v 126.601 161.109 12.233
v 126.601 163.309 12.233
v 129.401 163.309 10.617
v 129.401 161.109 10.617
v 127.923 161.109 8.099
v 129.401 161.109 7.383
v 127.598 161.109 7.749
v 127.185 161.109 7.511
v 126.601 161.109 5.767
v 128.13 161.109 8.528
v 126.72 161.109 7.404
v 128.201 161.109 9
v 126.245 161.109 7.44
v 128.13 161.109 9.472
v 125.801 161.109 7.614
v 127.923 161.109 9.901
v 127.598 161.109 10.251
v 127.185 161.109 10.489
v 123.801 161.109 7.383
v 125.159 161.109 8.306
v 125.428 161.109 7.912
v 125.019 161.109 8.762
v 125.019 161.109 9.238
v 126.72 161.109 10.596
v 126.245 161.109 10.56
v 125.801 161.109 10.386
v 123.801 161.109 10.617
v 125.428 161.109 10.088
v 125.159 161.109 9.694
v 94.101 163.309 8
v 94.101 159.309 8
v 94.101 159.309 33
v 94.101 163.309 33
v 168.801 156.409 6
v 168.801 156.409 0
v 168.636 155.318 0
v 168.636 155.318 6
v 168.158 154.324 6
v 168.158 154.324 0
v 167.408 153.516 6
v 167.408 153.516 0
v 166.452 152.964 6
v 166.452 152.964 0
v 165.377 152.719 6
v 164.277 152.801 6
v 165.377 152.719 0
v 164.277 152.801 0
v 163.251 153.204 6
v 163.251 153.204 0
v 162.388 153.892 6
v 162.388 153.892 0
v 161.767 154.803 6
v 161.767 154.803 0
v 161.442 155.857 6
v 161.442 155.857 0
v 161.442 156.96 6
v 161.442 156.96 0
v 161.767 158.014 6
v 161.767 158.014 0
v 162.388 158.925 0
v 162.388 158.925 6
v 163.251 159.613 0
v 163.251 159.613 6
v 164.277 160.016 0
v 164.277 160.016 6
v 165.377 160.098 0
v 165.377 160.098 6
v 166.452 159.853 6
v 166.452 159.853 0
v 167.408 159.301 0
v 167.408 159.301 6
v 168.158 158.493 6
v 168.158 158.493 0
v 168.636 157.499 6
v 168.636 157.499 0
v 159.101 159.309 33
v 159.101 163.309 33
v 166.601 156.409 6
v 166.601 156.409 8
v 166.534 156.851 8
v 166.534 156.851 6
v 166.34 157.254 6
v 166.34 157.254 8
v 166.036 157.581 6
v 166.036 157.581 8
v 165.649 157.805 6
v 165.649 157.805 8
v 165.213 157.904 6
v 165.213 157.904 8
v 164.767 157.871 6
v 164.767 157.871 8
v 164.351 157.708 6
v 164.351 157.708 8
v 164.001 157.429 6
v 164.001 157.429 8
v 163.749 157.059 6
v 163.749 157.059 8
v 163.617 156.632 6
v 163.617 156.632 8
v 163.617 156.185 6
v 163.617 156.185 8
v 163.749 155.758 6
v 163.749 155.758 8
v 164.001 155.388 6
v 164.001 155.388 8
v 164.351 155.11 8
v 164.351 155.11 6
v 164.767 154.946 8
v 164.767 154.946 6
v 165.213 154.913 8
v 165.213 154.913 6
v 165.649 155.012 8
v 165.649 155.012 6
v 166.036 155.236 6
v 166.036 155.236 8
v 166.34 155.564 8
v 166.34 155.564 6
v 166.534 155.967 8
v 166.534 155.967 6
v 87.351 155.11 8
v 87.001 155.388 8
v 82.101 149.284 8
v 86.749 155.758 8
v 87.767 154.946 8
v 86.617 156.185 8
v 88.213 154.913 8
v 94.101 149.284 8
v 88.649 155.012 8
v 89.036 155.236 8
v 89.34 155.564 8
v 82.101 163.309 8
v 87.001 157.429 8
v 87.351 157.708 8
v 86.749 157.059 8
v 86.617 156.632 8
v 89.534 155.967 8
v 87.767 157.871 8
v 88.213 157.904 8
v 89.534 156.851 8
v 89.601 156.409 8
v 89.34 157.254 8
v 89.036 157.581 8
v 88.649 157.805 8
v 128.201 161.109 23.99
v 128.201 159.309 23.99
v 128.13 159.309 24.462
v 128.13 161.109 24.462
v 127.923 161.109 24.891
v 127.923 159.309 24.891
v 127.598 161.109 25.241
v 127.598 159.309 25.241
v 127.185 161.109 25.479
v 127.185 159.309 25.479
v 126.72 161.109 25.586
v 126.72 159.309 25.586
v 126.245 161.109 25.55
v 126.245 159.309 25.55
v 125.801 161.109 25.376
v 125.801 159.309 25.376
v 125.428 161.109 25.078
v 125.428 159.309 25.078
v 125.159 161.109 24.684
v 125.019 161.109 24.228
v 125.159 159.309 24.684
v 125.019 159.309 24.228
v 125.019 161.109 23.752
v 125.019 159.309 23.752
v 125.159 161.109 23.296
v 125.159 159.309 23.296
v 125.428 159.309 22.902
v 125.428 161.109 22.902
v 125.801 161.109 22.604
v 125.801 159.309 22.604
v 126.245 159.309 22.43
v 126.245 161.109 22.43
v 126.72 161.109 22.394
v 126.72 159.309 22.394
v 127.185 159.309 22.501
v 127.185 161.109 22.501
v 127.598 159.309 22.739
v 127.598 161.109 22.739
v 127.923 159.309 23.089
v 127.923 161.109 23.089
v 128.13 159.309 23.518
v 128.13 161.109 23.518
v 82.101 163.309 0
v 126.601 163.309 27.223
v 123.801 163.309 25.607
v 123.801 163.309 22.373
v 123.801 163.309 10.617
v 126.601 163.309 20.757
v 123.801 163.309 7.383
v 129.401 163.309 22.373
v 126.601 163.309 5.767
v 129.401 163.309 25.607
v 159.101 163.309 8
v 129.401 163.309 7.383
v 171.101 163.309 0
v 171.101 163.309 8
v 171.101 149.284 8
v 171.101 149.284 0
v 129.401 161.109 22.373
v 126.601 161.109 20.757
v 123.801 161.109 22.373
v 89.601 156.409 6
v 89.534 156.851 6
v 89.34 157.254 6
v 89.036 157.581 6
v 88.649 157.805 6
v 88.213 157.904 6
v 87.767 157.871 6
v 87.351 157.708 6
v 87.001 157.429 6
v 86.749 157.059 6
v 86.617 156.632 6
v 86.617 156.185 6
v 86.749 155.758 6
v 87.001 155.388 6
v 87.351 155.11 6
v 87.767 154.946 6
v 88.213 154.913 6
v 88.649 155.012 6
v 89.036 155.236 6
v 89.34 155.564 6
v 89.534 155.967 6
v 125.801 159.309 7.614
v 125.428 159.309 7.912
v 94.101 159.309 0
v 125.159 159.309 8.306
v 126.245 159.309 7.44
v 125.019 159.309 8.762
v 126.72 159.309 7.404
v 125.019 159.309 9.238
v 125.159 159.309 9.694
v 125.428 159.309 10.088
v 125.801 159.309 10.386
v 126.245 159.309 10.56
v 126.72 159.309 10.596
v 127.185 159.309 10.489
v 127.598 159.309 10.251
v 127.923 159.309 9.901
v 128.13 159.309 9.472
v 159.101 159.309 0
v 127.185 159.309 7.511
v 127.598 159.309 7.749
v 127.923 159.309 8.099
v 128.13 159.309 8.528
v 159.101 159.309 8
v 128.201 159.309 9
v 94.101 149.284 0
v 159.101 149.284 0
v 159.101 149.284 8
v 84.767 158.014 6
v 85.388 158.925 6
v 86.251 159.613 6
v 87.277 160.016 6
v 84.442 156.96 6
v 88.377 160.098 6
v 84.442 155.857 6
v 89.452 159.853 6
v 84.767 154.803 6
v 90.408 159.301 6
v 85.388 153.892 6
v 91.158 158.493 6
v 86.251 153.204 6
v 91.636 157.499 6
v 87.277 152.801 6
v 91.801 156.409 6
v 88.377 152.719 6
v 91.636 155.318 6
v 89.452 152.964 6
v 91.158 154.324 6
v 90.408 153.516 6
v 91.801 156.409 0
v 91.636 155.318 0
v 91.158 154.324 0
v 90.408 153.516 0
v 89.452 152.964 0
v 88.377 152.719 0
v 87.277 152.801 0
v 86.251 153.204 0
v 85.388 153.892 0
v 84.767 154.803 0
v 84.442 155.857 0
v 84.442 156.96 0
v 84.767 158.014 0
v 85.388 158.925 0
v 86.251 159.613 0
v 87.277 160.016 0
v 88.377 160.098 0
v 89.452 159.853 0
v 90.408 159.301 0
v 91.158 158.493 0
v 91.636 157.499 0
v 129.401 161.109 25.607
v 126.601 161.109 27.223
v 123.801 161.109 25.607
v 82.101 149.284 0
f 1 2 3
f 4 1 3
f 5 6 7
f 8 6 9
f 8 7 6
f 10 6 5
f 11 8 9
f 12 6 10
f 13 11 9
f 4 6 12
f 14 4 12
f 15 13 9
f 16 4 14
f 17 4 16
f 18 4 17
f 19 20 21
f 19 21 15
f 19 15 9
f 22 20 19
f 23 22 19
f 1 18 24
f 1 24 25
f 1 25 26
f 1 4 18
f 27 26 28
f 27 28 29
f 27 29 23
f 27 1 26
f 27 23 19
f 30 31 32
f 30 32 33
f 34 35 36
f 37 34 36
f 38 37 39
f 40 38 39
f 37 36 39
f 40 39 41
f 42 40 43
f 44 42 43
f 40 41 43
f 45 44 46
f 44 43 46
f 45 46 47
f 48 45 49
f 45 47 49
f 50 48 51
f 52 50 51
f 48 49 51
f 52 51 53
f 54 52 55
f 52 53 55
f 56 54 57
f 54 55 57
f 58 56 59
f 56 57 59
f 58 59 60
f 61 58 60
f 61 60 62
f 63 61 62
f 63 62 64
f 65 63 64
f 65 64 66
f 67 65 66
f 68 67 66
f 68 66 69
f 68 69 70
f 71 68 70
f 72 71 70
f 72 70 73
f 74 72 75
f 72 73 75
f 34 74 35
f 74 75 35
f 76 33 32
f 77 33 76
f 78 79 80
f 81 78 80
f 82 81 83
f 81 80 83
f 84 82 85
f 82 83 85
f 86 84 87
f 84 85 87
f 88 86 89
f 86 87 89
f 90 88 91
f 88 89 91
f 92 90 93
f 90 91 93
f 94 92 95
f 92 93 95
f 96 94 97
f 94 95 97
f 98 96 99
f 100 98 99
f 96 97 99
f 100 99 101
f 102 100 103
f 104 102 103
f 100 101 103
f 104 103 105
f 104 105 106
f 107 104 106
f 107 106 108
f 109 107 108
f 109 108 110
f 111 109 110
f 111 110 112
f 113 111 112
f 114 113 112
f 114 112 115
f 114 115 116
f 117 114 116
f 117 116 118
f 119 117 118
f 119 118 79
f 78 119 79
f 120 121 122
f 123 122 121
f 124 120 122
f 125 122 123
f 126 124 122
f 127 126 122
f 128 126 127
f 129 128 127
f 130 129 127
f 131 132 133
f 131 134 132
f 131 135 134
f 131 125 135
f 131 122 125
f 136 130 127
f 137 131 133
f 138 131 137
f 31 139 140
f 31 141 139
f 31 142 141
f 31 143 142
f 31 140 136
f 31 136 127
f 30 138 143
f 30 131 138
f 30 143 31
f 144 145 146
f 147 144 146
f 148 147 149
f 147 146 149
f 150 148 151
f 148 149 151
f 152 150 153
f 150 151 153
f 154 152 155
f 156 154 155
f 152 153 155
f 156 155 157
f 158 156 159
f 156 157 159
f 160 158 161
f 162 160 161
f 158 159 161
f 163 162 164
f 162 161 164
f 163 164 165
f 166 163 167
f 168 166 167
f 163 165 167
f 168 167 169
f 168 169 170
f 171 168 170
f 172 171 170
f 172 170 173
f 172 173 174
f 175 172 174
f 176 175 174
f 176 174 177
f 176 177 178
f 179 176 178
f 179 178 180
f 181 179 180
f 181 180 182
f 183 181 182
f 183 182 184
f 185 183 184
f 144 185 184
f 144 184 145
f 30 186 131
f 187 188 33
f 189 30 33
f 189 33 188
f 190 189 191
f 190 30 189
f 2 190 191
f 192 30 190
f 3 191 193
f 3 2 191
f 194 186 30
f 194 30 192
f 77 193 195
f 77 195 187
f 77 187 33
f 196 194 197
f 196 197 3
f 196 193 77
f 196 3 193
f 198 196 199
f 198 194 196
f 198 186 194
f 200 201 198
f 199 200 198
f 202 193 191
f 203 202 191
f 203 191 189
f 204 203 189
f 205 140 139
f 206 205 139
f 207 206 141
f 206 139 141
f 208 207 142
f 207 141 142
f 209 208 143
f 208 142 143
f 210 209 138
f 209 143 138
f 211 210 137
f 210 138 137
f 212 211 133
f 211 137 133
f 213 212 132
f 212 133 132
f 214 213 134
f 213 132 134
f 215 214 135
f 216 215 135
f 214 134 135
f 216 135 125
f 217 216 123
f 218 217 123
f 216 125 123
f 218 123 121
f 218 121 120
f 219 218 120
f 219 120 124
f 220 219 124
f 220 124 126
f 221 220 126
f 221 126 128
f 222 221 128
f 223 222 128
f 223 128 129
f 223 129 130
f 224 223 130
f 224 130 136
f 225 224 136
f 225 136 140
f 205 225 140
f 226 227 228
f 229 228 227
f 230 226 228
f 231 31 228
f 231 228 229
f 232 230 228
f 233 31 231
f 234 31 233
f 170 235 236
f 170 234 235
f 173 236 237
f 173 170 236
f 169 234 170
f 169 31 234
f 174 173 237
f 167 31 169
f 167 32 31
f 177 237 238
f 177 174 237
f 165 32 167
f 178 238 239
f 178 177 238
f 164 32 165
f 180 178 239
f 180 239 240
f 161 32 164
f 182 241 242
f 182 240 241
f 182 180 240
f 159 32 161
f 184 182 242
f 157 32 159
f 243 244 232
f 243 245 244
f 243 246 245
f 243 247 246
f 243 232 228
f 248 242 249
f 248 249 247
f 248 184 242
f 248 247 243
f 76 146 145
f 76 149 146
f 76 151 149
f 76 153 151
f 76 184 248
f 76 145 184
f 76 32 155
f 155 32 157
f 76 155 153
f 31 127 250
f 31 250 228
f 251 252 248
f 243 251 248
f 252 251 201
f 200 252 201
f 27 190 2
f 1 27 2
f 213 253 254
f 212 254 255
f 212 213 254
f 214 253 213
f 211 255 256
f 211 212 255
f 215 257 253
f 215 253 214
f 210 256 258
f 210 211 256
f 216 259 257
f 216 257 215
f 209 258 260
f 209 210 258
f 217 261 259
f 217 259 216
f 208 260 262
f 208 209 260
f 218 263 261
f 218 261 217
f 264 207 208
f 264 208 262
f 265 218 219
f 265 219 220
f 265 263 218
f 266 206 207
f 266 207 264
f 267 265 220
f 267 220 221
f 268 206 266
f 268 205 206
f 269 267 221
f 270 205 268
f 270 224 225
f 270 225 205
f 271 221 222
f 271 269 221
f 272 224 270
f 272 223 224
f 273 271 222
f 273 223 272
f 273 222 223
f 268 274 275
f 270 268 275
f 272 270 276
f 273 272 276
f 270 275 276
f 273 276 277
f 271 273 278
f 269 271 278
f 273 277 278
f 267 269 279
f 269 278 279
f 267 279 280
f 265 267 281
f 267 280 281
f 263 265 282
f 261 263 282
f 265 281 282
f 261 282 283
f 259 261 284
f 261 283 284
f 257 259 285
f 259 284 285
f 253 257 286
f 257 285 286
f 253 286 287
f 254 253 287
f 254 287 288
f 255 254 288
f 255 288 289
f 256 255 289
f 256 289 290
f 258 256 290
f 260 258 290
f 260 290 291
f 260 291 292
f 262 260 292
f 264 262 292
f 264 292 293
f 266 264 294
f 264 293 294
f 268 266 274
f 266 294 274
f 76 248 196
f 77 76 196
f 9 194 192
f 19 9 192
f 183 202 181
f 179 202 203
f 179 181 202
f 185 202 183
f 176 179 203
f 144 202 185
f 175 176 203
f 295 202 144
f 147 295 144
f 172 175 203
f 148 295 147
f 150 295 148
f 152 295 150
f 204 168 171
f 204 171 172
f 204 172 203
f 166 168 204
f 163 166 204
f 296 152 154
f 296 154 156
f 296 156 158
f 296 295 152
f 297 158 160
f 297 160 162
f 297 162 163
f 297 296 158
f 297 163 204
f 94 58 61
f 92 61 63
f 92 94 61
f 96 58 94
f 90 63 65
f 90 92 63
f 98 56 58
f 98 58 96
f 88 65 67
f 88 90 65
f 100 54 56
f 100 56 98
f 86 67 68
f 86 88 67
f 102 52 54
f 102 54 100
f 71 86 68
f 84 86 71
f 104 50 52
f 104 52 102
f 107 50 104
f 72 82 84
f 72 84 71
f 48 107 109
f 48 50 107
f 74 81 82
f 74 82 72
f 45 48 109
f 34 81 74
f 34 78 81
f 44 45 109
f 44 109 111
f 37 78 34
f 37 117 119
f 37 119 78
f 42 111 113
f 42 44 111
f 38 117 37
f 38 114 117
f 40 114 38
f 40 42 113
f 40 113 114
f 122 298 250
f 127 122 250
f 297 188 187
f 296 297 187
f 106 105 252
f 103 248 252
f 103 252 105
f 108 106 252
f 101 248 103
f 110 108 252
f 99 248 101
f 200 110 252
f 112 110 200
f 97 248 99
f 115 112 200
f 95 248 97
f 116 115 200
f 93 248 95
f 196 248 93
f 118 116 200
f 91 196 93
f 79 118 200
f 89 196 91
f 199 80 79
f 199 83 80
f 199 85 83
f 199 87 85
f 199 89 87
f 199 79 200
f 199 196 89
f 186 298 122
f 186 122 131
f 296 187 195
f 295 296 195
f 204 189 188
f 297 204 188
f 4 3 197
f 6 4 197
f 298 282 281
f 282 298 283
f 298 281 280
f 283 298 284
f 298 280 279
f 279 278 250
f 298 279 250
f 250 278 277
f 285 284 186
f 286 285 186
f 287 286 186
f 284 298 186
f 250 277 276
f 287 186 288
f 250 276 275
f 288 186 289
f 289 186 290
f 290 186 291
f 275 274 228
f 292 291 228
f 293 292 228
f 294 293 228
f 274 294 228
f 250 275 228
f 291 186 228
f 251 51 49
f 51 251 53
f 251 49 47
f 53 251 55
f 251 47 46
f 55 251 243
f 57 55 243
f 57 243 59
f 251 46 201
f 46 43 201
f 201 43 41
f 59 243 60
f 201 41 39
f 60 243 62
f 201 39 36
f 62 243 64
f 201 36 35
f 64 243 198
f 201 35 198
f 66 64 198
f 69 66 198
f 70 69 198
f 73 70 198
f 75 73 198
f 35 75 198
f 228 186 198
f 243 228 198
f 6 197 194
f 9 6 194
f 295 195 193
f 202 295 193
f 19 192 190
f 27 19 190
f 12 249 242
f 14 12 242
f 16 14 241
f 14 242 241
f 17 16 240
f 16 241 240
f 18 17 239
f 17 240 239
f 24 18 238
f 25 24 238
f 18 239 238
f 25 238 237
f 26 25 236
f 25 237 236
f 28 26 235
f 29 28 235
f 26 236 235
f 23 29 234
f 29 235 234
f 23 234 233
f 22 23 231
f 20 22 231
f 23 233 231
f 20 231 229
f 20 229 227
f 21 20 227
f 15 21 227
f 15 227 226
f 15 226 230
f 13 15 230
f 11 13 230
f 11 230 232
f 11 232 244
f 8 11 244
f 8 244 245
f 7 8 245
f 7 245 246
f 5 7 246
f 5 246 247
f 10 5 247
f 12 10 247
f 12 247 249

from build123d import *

# Parameters (mm, degrees)
SKETCH001_W     = 89
SKETCH001_H     = 14.025192
PAD_DEPTH       = 8
SKETCH002_R     = 3.7
POCKET_DEPTH    = 6
SKETCH003_R     = 1.5
POCKET001_DEPTH = 8.001
SKETCH004_W     = 65
SKETCH004_H     = 4
PAD001_DEPTH    = 25
SKETCH007_W     = 65
SKETCH007_H     = 10.025192
POCKET004_DEPTH = 8
SKETCH008_R     = 1.6
POCKET005_DEPTH = 4
POCKET006_DEPTH = 2.2


with BuildPart() as part:
    # Sketch001 → Pad (new body)
    with BuildSketch(Plane.XY):
        with Locations((126.600648, 156.296259)):
            Rectangle(SKETCH001_W, SKETCH001_H)
    extrude(amount=PAD_DEPTH)

    # Sketch002 (on Face5 of Pad) → Pocket (cut)
    with BuildSketch(Plane(origin=(0, 0, 0), x_dir=(1, 0, 0), z_dir=(0, 0, -1))):
        with Locations((88.100648, -156.408663)):
            Circle(SKETCH002_R)
        with Locations((165.100648, -156.408663)):
            Circle(SKETCH002_R)
    extrude(amount=-POCKET_DEPTH, mode=Mode.SUBTRACT)

    # Sketch003 (on Face6 of Pad) → Pocket001 (cut, through all)
    with BuildSketch(Plane.XY.offset(8)):
        with Locations((88.100648, 156.408663)):
            Circle(SKETCH003_R)
        with Locations((165.100648, 156.408663)):
            Circle(SKETCH003_R)
    extrude(amount=-POCKET001_DEPTH, mode=Mode.SUBTRACT)

    # Sketch004 (on Face5 of Pocket001) → Pad001 (join)
    with BuildSketch(Plane.XY.offset(8)):
        with Locations((126.600648, 161.308855)):
            Rectangle(SKETCH004_W, SKETCH004_H)
    extrude(amount=PAD001_DEPTH)

    # Sketch007 (on Face5 of Pad001) → Pocket004 (cut)
    with BuildSketch(Plane.XY.offset(8)):
        with Locations((126.600648, 154.296259)):
            Rectangle(SKETCH007_W, SKETCH007_H)
    extrude(amount=-POCKET004_DEPTH, mode=Mode.SUBTRACT)

    # Sketch008 (on Face20 of Pocket004) → Pocket005 (cut)
    with BuildSketch(Plane.XZ.offset(-159.308855)):
        with Locations((126.600648, 9)):
            Circle(SKETCH008_R)
        with Locations((126.600648, 23.99)):
            Circle(SKETCH008_R)
    extrude(amount=-POCKET005_DEPTH, mode=Mode.SUBTRACT)

    # Sketch009 (on Face6 of Pocket005) → Pocket006 (cut)
    with BuildSketch(Plane(origin=(0, 163.308855, 0), x_dir=(-1, 0, 0), z_dir=(0, 1, 0))):
        Polygon((-123.800648, 25.606581), (-126.600648, 27.223162), (-129.400648, 25.606581), (-129.400648, 22.373419), (-126.600648, 20.756838), (-123.800648, 22.373419), align=None)
        Polygon((-123.800648, 10.616581), (-126.600648, 12.233162), (-129.400648, 10.616581), (-129.400648, 7.383419), (-126.600648, 5.766838), (-123.800648, 7.383419), align=None)
    extrude(amount=-POCKET006_DEPTH, mode=Mode.SUBTRACT)


solid = part.part
